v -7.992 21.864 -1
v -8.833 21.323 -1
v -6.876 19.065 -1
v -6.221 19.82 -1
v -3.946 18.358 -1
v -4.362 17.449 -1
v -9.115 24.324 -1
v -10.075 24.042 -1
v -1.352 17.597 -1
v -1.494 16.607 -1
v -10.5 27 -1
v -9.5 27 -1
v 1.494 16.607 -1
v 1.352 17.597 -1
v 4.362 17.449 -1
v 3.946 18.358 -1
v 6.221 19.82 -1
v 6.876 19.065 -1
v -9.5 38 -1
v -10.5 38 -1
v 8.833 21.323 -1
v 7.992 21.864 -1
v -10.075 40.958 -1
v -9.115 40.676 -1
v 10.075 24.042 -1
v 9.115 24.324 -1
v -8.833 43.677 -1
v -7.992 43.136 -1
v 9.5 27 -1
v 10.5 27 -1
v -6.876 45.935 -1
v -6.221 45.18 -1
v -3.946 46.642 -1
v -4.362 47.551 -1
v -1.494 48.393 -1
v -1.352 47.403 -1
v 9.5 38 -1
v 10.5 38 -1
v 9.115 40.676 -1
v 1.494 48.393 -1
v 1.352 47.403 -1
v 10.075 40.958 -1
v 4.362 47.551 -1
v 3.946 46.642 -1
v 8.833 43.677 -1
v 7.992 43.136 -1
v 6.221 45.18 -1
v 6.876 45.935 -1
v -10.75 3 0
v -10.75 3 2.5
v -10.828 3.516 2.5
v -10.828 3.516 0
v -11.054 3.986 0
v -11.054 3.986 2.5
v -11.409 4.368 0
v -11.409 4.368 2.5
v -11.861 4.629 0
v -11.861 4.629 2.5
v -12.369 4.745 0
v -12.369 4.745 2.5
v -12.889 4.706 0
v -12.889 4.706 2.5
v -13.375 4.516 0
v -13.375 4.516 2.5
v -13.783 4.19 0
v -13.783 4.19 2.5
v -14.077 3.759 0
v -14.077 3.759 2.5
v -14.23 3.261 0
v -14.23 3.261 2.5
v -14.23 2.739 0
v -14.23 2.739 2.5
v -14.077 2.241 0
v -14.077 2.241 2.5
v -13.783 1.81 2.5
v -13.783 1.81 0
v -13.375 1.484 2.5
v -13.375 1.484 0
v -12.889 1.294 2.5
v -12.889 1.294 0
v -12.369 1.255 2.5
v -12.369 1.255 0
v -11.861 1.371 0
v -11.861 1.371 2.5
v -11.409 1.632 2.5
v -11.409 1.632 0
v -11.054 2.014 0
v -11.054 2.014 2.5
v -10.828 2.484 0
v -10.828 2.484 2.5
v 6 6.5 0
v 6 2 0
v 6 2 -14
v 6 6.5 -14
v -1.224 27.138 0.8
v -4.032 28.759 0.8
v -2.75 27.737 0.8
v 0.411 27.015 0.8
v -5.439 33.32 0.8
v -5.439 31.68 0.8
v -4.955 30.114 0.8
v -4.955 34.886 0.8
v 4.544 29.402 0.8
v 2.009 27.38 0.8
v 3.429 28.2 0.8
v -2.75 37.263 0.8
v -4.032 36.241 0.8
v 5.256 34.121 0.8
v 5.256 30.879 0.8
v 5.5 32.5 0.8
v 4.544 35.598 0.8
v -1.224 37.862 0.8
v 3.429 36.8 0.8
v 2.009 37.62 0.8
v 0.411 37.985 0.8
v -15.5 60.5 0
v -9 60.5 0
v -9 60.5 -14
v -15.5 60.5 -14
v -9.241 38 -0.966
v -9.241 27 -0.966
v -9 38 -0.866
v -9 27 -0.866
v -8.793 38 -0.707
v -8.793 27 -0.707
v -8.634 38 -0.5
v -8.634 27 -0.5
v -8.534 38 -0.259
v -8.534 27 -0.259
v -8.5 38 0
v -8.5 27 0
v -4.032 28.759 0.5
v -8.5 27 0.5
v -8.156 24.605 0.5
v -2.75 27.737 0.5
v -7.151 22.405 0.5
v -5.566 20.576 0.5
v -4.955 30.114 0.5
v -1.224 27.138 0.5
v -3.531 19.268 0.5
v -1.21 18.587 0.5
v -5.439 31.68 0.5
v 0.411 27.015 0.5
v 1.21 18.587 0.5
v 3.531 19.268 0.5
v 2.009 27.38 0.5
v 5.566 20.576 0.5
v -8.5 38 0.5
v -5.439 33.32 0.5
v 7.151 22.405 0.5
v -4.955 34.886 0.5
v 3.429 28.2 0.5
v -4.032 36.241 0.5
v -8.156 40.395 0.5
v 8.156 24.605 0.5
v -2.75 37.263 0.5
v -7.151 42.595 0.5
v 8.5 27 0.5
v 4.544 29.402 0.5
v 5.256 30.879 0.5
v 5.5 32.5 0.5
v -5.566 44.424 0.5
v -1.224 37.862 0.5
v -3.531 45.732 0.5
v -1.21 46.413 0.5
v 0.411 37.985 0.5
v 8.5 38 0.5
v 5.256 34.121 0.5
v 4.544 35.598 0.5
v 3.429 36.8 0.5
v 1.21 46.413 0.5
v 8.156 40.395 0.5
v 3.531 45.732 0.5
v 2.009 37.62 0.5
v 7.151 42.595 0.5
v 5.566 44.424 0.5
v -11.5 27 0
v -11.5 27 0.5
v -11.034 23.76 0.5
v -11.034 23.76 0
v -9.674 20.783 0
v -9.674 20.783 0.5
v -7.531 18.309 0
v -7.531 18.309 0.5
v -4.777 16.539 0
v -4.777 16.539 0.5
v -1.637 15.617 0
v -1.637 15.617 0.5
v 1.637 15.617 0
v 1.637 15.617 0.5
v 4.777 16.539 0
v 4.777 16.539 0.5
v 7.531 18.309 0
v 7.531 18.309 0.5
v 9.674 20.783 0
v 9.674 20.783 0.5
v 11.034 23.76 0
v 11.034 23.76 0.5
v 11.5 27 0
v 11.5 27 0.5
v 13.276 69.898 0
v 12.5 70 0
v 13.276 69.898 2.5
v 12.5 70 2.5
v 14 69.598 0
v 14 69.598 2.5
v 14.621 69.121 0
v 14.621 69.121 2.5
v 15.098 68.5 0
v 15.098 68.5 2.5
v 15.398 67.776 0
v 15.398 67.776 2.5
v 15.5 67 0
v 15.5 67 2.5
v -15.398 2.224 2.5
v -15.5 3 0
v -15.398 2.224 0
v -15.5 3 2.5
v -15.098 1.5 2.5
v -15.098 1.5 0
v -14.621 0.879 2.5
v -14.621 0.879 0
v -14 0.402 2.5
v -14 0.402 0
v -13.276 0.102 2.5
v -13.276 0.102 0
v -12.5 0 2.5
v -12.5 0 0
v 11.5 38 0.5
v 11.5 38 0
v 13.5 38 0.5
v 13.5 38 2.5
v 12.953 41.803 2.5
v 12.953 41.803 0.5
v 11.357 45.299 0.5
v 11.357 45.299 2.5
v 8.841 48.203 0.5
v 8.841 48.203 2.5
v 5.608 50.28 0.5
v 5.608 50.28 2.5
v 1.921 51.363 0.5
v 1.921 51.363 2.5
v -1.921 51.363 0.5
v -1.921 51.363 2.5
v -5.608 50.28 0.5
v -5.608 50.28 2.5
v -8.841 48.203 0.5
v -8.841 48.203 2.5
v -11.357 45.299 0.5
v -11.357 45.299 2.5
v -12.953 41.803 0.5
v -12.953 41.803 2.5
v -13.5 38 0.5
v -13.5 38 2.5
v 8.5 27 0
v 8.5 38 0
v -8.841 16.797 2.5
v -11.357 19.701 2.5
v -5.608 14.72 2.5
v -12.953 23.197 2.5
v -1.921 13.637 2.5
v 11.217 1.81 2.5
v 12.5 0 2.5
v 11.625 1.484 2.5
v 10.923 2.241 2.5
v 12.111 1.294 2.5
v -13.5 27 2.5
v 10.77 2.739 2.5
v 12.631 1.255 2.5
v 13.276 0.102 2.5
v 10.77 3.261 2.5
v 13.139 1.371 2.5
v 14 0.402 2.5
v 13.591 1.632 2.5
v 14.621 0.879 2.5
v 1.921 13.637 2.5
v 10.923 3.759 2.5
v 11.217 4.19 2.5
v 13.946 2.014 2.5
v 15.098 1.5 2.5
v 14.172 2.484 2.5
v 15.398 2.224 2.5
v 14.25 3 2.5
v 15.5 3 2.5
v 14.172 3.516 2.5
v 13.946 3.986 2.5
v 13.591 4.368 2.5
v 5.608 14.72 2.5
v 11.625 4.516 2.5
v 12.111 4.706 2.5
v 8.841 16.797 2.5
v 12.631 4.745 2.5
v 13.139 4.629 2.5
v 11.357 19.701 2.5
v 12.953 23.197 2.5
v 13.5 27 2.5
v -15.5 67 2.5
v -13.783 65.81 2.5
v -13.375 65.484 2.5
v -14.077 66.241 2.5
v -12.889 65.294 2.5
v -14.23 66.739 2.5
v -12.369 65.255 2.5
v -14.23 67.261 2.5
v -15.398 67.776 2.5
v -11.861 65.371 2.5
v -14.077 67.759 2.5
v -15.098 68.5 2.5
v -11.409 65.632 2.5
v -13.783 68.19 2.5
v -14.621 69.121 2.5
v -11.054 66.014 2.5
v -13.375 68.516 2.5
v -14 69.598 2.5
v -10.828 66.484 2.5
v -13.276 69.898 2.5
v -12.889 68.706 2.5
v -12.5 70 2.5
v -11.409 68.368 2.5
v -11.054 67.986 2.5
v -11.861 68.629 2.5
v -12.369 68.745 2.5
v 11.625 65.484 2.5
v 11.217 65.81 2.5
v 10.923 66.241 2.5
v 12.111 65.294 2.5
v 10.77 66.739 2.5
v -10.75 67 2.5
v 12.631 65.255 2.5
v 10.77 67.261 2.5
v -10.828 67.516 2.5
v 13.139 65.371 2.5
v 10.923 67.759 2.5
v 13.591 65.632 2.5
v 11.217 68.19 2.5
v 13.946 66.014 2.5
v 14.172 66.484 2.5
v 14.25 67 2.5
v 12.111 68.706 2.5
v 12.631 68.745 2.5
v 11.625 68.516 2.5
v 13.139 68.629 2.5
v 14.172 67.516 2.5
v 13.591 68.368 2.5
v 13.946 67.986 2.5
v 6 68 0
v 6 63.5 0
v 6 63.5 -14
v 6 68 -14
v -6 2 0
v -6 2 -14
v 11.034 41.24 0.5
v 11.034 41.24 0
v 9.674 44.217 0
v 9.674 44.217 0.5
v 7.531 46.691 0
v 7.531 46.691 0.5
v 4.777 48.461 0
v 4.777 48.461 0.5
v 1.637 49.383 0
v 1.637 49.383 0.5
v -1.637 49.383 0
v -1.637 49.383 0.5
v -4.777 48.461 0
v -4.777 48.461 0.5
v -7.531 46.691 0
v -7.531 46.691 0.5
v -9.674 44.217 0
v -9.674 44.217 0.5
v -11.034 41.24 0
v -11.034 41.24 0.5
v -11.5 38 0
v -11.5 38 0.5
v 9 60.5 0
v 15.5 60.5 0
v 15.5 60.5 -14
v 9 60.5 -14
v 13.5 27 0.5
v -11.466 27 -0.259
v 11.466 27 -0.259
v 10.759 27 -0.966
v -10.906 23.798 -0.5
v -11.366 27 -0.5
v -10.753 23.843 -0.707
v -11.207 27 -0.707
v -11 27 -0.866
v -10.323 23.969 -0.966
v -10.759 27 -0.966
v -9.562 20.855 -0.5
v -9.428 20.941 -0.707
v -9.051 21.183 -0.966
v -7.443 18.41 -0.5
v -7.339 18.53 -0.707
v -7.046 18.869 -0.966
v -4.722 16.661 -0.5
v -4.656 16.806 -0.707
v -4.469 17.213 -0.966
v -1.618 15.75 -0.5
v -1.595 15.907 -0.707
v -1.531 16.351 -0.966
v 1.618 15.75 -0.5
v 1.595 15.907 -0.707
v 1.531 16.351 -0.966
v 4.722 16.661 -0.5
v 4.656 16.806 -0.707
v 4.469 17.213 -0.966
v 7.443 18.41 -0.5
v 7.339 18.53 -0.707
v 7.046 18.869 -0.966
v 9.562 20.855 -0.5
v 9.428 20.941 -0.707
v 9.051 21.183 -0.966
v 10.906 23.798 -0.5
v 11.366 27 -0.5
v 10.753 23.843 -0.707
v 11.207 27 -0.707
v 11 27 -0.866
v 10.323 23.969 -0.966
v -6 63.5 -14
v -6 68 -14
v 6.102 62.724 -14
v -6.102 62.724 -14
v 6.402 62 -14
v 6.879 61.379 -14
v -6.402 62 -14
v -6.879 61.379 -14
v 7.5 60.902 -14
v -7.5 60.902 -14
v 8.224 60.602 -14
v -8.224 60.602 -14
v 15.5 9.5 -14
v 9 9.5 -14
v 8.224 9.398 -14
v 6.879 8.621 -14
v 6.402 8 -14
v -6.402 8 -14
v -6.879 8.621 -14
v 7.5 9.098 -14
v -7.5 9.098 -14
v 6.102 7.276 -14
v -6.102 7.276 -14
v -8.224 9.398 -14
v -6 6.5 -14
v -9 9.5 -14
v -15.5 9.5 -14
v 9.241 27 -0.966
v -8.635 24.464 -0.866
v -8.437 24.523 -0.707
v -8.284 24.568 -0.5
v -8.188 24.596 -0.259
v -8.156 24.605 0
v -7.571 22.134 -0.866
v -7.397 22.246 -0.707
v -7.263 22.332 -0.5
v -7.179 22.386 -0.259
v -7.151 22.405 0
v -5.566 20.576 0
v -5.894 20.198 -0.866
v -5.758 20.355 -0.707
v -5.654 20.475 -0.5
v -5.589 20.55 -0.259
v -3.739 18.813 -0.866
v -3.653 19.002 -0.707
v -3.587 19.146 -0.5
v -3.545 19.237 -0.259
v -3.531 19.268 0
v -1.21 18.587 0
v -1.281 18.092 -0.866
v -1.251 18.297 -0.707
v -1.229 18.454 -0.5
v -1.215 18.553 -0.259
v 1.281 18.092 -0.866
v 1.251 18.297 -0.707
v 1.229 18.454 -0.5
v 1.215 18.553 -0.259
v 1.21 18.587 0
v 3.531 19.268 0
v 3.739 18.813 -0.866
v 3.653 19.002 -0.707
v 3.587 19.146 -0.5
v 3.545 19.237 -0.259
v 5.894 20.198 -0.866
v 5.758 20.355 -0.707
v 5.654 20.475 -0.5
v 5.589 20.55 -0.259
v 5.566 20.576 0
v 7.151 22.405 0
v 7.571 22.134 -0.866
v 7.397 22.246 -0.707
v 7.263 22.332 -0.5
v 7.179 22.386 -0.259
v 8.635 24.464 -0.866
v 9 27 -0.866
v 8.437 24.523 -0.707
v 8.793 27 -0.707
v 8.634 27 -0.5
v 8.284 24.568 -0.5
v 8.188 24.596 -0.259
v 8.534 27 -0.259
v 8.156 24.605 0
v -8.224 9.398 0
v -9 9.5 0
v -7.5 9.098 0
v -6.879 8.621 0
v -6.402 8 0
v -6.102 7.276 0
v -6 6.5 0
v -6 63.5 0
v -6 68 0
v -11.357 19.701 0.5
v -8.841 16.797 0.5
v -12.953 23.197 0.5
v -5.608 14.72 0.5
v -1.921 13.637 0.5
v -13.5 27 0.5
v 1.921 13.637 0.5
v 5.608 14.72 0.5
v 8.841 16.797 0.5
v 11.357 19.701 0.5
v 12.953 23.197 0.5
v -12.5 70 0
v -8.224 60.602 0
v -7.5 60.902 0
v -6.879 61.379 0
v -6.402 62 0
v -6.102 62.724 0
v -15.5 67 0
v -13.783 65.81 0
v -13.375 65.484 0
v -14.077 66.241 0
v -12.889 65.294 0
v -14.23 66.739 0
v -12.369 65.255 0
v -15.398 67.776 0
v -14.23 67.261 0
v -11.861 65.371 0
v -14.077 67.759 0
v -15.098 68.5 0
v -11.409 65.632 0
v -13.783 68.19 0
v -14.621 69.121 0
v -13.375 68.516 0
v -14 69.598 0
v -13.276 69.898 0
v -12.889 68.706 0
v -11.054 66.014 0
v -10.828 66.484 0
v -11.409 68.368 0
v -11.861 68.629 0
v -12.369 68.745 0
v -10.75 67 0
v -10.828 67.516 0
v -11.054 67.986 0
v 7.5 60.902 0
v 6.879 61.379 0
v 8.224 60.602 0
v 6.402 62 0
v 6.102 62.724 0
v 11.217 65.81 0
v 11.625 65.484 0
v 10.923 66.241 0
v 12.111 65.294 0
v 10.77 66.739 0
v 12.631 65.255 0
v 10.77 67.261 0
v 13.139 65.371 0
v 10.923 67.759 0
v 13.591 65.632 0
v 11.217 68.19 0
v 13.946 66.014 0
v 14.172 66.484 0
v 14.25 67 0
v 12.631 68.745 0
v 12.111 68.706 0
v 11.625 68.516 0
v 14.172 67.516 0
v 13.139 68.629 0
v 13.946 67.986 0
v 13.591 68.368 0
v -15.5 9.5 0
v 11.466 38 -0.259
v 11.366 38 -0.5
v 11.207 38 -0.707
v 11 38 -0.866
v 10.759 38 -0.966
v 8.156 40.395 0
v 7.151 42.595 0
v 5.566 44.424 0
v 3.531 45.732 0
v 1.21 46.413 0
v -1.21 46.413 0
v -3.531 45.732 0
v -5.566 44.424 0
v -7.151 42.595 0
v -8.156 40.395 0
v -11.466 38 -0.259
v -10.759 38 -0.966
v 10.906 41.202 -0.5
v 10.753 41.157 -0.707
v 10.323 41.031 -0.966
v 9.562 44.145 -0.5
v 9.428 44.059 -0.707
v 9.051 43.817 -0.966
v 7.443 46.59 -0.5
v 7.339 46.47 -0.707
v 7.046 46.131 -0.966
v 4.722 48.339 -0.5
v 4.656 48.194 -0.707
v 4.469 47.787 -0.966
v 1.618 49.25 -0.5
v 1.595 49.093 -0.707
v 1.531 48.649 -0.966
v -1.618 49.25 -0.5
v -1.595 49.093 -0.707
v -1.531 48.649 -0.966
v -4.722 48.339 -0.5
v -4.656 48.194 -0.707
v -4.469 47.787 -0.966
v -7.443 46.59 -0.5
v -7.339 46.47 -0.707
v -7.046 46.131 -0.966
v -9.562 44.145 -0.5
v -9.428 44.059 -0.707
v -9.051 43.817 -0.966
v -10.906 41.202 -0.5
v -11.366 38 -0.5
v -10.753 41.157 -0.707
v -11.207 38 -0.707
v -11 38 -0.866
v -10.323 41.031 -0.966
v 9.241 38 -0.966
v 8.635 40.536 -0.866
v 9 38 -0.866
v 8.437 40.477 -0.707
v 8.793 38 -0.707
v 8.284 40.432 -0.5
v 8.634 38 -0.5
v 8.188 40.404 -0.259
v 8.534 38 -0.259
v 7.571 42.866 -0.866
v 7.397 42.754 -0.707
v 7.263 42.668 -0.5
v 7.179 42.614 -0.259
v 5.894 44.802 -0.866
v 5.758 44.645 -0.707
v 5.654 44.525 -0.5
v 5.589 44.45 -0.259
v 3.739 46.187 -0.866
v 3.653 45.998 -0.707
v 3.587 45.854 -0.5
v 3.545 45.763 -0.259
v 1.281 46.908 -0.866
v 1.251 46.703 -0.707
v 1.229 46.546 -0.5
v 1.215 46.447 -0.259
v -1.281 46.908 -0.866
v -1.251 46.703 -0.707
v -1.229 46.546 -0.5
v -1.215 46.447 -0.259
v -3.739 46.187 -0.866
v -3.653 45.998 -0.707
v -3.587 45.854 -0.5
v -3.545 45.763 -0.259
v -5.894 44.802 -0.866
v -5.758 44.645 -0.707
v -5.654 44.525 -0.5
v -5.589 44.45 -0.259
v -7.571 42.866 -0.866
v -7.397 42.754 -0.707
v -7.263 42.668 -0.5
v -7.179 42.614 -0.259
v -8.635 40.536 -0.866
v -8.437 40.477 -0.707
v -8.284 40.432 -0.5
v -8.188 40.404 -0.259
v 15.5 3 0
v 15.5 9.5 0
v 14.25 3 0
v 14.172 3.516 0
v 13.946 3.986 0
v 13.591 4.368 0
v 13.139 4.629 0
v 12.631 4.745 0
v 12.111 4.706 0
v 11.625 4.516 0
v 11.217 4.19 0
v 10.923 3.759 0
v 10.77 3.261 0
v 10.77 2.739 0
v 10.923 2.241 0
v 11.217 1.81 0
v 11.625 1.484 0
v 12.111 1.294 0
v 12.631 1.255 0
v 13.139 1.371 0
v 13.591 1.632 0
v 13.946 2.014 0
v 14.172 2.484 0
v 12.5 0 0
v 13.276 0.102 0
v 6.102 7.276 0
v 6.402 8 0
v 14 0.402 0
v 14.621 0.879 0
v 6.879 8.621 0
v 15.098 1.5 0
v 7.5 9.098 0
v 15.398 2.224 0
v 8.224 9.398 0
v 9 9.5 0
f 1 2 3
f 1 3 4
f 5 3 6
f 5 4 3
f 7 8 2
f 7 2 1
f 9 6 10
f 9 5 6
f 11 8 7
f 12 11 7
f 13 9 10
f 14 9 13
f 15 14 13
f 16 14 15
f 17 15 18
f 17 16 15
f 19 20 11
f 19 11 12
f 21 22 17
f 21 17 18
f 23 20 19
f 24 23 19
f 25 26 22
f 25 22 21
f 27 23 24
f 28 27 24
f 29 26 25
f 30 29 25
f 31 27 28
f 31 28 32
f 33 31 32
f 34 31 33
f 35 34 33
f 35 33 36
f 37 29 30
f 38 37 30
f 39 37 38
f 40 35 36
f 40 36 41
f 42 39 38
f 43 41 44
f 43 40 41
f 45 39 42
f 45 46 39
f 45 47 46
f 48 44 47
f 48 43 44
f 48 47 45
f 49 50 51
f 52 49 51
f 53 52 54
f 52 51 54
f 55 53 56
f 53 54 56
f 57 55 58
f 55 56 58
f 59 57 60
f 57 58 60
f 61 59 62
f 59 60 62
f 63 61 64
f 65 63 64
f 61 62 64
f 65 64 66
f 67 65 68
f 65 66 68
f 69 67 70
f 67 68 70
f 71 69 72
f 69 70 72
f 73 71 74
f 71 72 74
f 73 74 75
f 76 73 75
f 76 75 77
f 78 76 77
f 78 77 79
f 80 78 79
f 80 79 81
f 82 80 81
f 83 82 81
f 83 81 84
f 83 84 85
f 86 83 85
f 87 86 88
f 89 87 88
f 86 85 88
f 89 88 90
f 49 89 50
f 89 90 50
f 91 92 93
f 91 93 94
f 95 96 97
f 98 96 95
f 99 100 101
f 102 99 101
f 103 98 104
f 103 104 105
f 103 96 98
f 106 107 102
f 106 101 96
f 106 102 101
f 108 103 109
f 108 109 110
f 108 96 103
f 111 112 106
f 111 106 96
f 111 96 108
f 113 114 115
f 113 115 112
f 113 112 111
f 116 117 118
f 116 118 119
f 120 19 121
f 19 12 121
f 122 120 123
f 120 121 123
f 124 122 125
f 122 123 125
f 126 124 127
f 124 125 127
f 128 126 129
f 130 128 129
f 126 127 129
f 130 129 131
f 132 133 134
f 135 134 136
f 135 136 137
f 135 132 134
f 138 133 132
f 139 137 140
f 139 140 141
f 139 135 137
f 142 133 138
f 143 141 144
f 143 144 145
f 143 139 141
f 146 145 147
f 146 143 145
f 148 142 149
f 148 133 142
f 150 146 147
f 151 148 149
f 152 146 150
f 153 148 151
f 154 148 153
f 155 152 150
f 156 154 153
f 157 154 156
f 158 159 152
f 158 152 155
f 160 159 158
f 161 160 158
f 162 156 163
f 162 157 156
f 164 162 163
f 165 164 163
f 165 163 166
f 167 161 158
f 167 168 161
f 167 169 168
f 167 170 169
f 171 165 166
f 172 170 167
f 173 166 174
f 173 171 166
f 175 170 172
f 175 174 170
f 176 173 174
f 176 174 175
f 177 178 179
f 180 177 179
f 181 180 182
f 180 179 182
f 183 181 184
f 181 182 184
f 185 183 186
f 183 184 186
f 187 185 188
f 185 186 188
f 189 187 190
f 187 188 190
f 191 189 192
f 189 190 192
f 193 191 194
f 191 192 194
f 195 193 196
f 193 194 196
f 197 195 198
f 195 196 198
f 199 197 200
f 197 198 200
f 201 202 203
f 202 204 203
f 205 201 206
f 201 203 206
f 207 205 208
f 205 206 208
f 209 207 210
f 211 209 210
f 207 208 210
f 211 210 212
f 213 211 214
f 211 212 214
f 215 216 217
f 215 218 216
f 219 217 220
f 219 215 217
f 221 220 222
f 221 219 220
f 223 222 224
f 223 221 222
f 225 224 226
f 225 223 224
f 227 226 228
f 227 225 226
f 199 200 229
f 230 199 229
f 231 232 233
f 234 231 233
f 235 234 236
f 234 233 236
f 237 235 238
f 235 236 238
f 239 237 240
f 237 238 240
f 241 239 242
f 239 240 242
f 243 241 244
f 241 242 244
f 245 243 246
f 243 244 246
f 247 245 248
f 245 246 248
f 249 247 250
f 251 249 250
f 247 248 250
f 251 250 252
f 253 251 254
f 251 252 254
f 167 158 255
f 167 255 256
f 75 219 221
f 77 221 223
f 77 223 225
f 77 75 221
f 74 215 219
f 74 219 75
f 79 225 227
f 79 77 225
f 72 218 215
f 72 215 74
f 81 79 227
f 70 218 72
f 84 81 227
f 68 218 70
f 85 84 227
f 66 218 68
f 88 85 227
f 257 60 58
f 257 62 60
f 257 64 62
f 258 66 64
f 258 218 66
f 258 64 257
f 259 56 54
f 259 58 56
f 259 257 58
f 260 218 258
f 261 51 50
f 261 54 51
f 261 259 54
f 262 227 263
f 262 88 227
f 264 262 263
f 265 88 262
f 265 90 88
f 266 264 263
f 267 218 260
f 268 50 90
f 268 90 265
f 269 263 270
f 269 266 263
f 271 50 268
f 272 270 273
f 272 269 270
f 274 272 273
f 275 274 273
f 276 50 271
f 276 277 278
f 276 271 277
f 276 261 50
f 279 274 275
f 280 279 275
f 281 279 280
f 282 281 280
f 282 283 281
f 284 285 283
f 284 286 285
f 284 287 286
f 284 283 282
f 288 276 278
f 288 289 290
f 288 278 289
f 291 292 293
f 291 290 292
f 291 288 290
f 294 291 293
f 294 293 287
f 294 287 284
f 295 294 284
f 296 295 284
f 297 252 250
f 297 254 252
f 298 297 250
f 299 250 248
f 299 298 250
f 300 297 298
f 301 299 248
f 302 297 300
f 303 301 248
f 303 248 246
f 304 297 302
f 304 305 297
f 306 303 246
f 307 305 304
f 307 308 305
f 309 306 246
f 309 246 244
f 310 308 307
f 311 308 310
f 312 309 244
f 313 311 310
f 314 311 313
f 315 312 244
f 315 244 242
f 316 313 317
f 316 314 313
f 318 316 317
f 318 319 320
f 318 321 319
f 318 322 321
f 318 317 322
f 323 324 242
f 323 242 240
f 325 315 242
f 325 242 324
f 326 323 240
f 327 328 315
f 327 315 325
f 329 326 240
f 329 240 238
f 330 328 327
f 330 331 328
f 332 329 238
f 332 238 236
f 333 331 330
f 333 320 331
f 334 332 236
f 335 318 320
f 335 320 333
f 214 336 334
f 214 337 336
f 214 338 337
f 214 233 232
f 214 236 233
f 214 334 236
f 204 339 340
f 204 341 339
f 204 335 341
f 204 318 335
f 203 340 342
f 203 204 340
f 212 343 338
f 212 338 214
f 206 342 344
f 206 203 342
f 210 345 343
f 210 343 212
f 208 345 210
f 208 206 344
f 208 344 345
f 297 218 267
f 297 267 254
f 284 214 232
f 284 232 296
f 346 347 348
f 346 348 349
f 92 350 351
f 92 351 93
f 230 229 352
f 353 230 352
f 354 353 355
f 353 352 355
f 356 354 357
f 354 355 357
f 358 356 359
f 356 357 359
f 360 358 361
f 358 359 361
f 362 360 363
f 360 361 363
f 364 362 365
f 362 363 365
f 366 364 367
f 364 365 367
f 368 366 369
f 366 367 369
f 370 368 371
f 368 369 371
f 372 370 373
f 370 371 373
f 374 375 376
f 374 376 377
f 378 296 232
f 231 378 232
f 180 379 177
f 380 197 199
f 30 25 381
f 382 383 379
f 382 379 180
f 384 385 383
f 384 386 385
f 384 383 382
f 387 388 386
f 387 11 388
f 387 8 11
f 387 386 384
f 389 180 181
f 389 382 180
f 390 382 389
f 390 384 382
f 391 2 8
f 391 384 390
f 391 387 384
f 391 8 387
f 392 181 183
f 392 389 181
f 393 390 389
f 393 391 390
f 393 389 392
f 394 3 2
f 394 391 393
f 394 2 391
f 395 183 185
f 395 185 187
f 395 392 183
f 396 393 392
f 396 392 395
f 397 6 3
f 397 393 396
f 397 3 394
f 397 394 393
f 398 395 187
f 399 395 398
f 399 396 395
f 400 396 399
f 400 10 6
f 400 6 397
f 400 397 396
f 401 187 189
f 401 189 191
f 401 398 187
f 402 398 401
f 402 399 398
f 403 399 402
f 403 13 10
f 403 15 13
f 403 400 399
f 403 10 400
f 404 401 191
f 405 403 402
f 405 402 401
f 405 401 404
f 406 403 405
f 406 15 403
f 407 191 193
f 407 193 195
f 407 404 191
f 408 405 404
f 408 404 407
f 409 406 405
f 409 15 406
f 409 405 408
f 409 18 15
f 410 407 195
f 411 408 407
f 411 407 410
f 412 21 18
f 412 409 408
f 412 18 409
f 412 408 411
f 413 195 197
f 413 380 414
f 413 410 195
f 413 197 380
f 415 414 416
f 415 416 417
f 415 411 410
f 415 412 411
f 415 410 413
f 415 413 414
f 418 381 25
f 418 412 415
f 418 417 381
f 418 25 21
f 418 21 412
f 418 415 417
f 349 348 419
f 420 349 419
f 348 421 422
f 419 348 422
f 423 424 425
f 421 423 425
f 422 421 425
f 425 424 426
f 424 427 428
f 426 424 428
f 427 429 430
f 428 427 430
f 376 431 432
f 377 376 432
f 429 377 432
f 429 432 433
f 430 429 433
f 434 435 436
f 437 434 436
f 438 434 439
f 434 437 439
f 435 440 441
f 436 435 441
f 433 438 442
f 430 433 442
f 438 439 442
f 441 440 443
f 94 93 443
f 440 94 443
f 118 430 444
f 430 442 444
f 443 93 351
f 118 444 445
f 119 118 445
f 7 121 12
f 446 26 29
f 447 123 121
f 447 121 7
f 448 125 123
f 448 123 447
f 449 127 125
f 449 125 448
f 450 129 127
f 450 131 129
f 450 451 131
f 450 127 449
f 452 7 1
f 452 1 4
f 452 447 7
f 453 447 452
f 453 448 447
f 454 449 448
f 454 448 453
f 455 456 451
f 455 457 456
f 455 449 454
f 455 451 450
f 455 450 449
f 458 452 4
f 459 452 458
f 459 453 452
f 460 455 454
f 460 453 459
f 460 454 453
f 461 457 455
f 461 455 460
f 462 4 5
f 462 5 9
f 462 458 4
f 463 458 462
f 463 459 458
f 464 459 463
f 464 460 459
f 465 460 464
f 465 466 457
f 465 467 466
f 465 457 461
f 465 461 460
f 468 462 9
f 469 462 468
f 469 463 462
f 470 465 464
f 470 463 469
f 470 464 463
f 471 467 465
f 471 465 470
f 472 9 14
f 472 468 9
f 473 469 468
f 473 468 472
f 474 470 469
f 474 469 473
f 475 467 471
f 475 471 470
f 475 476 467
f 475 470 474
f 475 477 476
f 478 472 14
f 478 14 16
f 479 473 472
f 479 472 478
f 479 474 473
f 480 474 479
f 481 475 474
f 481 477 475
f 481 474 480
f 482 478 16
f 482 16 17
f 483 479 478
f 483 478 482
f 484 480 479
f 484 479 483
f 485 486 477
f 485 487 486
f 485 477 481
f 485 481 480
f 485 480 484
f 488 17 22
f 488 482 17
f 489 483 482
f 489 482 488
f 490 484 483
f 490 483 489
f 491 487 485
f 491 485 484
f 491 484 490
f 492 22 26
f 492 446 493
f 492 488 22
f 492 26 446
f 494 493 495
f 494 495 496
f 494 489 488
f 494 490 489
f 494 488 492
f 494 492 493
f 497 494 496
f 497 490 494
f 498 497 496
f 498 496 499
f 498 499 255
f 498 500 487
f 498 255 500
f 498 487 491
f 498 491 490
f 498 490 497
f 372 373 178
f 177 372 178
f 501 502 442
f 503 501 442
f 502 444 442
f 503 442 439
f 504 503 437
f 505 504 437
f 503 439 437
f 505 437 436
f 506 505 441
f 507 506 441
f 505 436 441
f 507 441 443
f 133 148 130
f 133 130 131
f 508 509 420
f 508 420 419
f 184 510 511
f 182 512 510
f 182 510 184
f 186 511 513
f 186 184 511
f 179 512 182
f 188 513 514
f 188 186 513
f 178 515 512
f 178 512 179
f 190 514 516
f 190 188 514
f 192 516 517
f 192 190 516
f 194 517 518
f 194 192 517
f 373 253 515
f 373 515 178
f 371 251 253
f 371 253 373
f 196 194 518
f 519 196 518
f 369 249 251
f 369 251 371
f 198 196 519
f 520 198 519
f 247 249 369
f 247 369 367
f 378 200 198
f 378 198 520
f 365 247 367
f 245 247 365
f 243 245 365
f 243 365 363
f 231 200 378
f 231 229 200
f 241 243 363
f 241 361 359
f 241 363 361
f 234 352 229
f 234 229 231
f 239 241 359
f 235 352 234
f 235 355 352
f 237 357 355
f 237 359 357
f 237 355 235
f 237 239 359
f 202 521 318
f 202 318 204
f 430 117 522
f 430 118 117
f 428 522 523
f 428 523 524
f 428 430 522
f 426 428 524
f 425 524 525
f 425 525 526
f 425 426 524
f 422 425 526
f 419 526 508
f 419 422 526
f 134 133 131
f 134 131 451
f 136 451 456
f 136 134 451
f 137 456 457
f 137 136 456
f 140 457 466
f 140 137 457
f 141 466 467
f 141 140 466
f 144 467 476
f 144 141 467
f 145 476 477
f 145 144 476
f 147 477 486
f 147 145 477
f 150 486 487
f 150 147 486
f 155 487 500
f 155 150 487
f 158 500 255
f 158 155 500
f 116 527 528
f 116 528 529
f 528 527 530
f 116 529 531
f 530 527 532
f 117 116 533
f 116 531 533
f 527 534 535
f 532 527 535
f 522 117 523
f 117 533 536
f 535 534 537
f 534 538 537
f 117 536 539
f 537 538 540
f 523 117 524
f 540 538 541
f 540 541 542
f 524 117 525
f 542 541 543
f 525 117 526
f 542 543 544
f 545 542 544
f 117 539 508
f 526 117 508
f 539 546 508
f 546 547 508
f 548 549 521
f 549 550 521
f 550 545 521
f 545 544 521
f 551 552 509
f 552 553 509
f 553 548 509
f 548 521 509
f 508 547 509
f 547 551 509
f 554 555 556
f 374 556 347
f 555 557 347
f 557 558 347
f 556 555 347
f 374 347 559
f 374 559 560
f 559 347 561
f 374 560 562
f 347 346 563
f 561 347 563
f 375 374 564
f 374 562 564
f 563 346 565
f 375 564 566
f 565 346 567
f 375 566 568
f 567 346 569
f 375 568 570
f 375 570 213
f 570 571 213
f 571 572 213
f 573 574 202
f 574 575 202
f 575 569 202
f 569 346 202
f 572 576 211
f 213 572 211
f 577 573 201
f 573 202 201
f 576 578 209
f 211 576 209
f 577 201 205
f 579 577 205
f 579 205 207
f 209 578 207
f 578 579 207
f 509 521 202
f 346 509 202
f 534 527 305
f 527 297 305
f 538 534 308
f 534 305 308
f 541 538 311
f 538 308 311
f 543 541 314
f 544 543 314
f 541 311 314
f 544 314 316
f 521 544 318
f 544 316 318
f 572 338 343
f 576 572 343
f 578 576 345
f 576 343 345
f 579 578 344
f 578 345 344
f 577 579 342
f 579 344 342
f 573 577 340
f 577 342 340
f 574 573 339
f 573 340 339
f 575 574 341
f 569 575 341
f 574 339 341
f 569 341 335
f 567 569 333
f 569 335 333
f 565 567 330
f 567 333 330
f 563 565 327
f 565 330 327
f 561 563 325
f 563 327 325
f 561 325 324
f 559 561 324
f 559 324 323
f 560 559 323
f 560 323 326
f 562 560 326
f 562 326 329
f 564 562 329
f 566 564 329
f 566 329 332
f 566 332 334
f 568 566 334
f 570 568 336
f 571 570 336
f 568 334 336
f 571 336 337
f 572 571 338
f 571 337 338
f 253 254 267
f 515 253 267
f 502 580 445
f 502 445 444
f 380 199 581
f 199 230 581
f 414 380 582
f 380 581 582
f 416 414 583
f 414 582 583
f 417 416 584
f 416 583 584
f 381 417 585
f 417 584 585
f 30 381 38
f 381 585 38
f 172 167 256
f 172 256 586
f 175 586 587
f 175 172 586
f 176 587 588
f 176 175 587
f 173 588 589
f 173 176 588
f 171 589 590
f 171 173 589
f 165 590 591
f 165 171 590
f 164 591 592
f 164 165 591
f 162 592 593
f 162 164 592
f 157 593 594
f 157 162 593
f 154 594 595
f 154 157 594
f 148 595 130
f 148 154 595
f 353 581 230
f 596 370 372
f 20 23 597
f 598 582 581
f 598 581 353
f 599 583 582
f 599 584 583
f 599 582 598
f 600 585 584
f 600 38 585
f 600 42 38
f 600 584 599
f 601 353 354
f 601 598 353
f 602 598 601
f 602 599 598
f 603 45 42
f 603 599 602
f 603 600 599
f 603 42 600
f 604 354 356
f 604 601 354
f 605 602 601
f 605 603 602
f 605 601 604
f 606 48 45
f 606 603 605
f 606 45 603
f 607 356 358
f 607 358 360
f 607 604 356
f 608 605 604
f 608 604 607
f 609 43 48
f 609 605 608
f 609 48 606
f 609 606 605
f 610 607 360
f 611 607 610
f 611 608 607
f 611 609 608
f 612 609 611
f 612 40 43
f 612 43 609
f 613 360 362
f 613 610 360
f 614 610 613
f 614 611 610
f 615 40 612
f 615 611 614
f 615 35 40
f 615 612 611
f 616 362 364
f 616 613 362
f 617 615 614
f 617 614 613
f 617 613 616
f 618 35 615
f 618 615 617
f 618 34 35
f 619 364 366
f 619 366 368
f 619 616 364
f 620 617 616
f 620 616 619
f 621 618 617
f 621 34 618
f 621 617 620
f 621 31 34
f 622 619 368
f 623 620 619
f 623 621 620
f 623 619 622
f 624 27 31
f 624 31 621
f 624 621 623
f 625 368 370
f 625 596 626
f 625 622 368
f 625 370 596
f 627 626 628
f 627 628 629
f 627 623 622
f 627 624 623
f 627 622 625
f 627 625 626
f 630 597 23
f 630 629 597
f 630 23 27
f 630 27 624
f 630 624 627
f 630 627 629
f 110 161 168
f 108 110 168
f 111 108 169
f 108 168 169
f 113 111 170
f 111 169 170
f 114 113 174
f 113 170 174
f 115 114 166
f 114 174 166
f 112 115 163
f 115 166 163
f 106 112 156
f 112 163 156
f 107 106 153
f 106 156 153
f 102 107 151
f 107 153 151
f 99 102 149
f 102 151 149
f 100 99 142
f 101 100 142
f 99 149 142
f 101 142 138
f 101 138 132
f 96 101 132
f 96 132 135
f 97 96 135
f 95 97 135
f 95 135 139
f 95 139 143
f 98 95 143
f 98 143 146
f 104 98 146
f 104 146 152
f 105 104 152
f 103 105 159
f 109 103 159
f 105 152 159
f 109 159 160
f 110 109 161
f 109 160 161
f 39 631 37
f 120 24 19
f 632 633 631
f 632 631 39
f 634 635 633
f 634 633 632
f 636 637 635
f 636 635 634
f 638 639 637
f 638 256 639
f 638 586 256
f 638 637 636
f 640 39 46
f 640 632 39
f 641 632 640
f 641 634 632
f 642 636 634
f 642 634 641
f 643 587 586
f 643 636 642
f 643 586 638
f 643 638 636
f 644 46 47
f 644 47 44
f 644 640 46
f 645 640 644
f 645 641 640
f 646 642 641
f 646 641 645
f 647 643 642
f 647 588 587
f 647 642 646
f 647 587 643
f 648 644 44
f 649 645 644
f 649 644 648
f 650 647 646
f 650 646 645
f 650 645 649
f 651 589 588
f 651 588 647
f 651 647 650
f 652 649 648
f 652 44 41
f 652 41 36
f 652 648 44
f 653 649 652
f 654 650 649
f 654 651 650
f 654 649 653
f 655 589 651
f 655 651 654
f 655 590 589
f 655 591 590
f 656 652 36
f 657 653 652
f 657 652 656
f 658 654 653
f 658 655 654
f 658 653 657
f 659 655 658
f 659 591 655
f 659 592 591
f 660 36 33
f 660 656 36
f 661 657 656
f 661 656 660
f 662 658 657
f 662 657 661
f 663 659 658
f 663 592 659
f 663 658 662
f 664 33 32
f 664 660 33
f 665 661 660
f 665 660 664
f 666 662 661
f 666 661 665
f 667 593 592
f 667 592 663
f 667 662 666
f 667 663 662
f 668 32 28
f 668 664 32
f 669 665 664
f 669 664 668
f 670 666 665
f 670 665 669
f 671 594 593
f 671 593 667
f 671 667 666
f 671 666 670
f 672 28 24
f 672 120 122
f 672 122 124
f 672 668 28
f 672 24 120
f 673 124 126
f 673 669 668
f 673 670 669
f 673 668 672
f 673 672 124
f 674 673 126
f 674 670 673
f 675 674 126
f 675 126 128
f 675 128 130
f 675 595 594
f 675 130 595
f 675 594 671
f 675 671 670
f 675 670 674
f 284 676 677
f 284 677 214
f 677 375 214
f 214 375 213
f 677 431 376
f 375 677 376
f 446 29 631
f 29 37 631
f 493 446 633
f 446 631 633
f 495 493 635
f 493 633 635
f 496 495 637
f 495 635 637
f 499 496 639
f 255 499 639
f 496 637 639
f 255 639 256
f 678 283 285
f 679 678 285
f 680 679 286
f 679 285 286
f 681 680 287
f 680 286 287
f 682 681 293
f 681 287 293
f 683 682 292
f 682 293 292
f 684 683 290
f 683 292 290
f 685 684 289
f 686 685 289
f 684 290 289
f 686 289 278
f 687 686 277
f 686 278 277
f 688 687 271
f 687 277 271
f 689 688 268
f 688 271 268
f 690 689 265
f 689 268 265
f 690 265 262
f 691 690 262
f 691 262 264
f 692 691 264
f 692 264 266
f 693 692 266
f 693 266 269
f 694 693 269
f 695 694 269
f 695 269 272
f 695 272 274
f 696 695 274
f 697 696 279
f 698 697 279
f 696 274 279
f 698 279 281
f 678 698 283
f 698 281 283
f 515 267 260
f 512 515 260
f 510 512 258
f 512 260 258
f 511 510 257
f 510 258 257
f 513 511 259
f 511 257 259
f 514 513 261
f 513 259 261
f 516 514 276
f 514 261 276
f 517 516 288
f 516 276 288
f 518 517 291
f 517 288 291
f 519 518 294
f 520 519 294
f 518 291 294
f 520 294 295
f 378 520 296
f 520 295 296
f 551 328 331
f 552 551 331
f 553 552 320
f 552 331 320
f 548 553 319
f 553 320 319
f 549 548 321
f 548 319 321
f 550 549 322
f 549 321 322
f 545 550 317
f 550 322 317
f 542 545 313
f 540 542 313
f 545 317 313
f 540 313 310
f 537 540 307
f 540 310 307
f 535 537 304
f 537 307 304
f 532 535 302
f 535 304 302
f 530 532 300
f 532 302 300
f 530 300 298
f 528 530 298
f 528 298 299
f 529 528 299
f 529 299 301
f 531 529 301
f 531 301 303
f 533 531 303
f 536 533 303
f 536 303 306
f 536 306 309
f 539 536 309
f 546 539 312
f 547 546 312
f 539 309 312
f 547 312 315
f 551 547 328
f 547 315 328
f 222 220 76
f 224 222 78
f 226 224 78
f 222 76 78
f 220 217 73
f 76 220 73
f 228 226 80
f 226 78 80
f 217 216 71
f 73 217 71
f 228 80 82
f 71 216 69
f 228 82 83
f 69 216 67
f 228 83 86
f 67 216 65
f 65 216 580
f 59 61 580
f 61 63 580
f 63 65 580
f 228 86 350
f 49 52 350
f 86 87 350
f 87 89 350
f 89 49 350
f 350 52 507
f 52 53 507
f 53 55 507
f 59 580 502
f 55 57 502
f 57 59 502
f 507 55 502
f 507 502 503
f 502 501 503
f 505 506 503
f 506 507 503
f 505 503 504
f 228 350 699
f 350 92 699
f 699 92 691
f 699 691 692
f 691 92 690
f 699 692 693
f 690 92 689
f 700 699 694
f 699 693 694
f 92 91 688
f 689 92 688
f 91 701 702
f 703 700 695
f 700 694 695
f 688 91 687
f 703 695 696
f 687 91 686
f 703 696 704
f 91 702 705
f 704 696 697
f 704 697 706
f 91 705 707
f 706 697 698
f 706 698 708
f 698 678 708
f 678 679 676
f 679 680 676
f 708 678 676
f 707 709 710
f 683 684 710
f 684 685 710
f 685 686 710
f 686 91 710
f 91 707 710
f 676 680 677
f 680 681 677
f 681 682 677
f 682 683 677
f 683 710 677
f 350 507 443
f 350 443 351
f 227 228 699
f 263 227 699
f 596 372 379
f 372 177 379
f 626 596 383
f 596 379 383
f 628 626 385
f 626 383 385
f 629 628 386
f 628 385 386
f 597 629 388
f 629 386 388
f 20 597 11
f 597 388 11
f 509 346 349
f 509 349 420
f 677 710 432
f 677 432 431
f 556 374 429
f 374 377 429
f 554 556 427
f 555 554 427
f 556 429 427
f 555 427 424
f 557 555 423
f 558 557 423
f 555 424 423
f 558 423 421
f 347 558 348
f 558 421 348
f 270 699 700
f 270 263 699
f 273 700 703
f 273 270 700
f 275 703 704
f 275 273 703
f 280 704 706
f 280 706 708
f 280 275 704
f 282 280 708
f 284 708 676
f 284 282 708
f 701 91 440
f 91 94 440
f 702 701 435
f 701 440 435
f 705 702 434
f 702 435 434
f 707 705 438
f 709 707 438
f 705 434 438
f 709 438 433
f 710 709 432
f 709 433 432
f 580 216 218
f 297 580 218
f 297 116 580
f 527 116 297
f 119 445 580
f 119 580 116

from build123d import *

# Parameters (mm, degrees)
SKETCH_W        = 31
SKETCH_H        = 70
PAD_DEPTH       = 2.5
SKETCH001_R     = 1.75
POCKET_DEPTH    = 2.5
FILLET_R        = 3
PAD001_DEPTH    = 14
FILLET001_R     = 3
POCKET001_DEPTH = 2
POCKET002_DEPTH = 1.5
FILLET002_R     = 1
SKETCH005_R     = 5.5
PAD002_DEPTH    = 0.3


with BuildPart() as part:
    # Sketch → Pad (new body)
    with BuildSketch(Plane.XY):
        with Locations((0, 35)):
            Rectangle(SKETCH_W, SKETCH_H)
    extrude(amount=PAD_DEPTH)

    # Sketch001 (on Face6 of Pad) → Pocket (cut)
    with BuildSketch(Plane.XY.offset(2.5)):
        with Locations((-12.5, 67)):
            Circle(SKETCH001_R)
        with Locations((12.5, 67)):
            Circle(SKETCH001_R)
        with Locations((-12.5, 3)):
            Circle(SKETCH001_R)
        with Locations((12.5, 3)):
            Circle(SKETCH001_R)
    extrude(amount=-POCKET_DEPTH, mode=Mode.SUBTRACT)

    # Fillet
    fillet_edges = [part.edges().sort_by_distance(p)[0] for p in [
        (-15.5, 0, 1.25),
        (15.5, 0, 1.25),
        (-15.5, 70, 1.25),
        (15.5, 70, 1.25),
    ]]
    fillet(fillet_edges, radius=FILLET_R)

    # Sketch002 (on Face2 of Fillet) → Pad001 (join)
    with BuildSketch(Plane(origin=(0, 0, 0), x_dir=(1, 0, 0), z_dir=(0, 0, -1))):
        Polygon((-6, -2), (6, -2), (6, -9.5), (15.5, -9.5), (15.5, -60.5), (6, -60.5), (6, -68), (-6, -68), (-6, -60.5), (-15.5, -60.5), (-15.5, -9.5), (-6, -9.5), align=None)
    extrude(amount=PAD001_DEPTH)

    # Fillet001
    fillet001_edges = [part.edges().sort_by_distance(p)[0] for p in [
        (6, 9.5, -7),
        (-6, 9.5, -7),
        (-6, 60.5, -7),
        (6, 60.5, -7),
    ]]
    fillet(fillet001_edges, radius=FILLET001_R)

    # Sketch003 (on Face20 of Fillet001) → Pocket001 (cut)
    with BuildSketch(Plane.XY.offset(2.5)):
        with BuildLine():
            ThreePointArc((13.5, 38), (0, 51.5), (-13.5, 38))
            Line((-13.5, 38), (-13.5, 27))
            ThreePointArc((-13.5, 27), (0, 13.5), (13.5, 27))
            Line((13.5, 27), (13.5, 38))
        make_face()
    extrude(amount=-POCKET001_DEPTH, mode=Mode.SUBTRACT)

    # Sketch004 (on Face37 of Pocket001) → Pocket002 (cut)
    with BuildSketch(Plane.XY.offset(0.5)):
        with BuildLine():
            ThreePointArc((11.5, 38), (0, 49.5), (-11.5, 38))
            Line((-11.5, 38), (-11.5, 27))
            ThreePointArc((-11.5, 27), (0, 15.5), (11.5, 27))
            Line((11.5, 27), (11.5, 38))
        make_face()
        with BuildLine():
            ThreePointArc((8.5, 38), (0, 46.5), (-8.5, 38))
            Line((-8.5, 38), (-8.5, 27))
            ThreePointArc((-8.5, 27), (0, 18.5), (8.5, 27))
            Line((8.5, 27), (8.5, 38))
        make_face(mode=Mode.SUBTRACT)
    extrude(amount=-POCKET002_DEPTH, mode=Mode.SUBTRACT)

    # Fillet002
    fillet002_edges = [part.edges().sort_by_distance(p)[0] for p in [
        (0, 49.5, -1),
        (0, 15.5, -1),
        (-11.5, 32.5, -1),
        (0, 46.5, -1),
        (8.5, 32.5, -1),
        (0, 18.5, -1),
        (-8.5, 32.5, -1),
        (11.5, 32.5, -1),
    ]]
    fillet(fillet002_edges, radius=FILLET002_R)

    # Sketch005 (on Face36 of Fillet002) → Pad002 (join)
    with BuildSketch(Plane.XY.offset(0.5)):
        with Locations((0, 32.5)):
            Circle(SKETCH005_R)
    extrude(amount=PAD002_DEPTH)


solid = part.part
